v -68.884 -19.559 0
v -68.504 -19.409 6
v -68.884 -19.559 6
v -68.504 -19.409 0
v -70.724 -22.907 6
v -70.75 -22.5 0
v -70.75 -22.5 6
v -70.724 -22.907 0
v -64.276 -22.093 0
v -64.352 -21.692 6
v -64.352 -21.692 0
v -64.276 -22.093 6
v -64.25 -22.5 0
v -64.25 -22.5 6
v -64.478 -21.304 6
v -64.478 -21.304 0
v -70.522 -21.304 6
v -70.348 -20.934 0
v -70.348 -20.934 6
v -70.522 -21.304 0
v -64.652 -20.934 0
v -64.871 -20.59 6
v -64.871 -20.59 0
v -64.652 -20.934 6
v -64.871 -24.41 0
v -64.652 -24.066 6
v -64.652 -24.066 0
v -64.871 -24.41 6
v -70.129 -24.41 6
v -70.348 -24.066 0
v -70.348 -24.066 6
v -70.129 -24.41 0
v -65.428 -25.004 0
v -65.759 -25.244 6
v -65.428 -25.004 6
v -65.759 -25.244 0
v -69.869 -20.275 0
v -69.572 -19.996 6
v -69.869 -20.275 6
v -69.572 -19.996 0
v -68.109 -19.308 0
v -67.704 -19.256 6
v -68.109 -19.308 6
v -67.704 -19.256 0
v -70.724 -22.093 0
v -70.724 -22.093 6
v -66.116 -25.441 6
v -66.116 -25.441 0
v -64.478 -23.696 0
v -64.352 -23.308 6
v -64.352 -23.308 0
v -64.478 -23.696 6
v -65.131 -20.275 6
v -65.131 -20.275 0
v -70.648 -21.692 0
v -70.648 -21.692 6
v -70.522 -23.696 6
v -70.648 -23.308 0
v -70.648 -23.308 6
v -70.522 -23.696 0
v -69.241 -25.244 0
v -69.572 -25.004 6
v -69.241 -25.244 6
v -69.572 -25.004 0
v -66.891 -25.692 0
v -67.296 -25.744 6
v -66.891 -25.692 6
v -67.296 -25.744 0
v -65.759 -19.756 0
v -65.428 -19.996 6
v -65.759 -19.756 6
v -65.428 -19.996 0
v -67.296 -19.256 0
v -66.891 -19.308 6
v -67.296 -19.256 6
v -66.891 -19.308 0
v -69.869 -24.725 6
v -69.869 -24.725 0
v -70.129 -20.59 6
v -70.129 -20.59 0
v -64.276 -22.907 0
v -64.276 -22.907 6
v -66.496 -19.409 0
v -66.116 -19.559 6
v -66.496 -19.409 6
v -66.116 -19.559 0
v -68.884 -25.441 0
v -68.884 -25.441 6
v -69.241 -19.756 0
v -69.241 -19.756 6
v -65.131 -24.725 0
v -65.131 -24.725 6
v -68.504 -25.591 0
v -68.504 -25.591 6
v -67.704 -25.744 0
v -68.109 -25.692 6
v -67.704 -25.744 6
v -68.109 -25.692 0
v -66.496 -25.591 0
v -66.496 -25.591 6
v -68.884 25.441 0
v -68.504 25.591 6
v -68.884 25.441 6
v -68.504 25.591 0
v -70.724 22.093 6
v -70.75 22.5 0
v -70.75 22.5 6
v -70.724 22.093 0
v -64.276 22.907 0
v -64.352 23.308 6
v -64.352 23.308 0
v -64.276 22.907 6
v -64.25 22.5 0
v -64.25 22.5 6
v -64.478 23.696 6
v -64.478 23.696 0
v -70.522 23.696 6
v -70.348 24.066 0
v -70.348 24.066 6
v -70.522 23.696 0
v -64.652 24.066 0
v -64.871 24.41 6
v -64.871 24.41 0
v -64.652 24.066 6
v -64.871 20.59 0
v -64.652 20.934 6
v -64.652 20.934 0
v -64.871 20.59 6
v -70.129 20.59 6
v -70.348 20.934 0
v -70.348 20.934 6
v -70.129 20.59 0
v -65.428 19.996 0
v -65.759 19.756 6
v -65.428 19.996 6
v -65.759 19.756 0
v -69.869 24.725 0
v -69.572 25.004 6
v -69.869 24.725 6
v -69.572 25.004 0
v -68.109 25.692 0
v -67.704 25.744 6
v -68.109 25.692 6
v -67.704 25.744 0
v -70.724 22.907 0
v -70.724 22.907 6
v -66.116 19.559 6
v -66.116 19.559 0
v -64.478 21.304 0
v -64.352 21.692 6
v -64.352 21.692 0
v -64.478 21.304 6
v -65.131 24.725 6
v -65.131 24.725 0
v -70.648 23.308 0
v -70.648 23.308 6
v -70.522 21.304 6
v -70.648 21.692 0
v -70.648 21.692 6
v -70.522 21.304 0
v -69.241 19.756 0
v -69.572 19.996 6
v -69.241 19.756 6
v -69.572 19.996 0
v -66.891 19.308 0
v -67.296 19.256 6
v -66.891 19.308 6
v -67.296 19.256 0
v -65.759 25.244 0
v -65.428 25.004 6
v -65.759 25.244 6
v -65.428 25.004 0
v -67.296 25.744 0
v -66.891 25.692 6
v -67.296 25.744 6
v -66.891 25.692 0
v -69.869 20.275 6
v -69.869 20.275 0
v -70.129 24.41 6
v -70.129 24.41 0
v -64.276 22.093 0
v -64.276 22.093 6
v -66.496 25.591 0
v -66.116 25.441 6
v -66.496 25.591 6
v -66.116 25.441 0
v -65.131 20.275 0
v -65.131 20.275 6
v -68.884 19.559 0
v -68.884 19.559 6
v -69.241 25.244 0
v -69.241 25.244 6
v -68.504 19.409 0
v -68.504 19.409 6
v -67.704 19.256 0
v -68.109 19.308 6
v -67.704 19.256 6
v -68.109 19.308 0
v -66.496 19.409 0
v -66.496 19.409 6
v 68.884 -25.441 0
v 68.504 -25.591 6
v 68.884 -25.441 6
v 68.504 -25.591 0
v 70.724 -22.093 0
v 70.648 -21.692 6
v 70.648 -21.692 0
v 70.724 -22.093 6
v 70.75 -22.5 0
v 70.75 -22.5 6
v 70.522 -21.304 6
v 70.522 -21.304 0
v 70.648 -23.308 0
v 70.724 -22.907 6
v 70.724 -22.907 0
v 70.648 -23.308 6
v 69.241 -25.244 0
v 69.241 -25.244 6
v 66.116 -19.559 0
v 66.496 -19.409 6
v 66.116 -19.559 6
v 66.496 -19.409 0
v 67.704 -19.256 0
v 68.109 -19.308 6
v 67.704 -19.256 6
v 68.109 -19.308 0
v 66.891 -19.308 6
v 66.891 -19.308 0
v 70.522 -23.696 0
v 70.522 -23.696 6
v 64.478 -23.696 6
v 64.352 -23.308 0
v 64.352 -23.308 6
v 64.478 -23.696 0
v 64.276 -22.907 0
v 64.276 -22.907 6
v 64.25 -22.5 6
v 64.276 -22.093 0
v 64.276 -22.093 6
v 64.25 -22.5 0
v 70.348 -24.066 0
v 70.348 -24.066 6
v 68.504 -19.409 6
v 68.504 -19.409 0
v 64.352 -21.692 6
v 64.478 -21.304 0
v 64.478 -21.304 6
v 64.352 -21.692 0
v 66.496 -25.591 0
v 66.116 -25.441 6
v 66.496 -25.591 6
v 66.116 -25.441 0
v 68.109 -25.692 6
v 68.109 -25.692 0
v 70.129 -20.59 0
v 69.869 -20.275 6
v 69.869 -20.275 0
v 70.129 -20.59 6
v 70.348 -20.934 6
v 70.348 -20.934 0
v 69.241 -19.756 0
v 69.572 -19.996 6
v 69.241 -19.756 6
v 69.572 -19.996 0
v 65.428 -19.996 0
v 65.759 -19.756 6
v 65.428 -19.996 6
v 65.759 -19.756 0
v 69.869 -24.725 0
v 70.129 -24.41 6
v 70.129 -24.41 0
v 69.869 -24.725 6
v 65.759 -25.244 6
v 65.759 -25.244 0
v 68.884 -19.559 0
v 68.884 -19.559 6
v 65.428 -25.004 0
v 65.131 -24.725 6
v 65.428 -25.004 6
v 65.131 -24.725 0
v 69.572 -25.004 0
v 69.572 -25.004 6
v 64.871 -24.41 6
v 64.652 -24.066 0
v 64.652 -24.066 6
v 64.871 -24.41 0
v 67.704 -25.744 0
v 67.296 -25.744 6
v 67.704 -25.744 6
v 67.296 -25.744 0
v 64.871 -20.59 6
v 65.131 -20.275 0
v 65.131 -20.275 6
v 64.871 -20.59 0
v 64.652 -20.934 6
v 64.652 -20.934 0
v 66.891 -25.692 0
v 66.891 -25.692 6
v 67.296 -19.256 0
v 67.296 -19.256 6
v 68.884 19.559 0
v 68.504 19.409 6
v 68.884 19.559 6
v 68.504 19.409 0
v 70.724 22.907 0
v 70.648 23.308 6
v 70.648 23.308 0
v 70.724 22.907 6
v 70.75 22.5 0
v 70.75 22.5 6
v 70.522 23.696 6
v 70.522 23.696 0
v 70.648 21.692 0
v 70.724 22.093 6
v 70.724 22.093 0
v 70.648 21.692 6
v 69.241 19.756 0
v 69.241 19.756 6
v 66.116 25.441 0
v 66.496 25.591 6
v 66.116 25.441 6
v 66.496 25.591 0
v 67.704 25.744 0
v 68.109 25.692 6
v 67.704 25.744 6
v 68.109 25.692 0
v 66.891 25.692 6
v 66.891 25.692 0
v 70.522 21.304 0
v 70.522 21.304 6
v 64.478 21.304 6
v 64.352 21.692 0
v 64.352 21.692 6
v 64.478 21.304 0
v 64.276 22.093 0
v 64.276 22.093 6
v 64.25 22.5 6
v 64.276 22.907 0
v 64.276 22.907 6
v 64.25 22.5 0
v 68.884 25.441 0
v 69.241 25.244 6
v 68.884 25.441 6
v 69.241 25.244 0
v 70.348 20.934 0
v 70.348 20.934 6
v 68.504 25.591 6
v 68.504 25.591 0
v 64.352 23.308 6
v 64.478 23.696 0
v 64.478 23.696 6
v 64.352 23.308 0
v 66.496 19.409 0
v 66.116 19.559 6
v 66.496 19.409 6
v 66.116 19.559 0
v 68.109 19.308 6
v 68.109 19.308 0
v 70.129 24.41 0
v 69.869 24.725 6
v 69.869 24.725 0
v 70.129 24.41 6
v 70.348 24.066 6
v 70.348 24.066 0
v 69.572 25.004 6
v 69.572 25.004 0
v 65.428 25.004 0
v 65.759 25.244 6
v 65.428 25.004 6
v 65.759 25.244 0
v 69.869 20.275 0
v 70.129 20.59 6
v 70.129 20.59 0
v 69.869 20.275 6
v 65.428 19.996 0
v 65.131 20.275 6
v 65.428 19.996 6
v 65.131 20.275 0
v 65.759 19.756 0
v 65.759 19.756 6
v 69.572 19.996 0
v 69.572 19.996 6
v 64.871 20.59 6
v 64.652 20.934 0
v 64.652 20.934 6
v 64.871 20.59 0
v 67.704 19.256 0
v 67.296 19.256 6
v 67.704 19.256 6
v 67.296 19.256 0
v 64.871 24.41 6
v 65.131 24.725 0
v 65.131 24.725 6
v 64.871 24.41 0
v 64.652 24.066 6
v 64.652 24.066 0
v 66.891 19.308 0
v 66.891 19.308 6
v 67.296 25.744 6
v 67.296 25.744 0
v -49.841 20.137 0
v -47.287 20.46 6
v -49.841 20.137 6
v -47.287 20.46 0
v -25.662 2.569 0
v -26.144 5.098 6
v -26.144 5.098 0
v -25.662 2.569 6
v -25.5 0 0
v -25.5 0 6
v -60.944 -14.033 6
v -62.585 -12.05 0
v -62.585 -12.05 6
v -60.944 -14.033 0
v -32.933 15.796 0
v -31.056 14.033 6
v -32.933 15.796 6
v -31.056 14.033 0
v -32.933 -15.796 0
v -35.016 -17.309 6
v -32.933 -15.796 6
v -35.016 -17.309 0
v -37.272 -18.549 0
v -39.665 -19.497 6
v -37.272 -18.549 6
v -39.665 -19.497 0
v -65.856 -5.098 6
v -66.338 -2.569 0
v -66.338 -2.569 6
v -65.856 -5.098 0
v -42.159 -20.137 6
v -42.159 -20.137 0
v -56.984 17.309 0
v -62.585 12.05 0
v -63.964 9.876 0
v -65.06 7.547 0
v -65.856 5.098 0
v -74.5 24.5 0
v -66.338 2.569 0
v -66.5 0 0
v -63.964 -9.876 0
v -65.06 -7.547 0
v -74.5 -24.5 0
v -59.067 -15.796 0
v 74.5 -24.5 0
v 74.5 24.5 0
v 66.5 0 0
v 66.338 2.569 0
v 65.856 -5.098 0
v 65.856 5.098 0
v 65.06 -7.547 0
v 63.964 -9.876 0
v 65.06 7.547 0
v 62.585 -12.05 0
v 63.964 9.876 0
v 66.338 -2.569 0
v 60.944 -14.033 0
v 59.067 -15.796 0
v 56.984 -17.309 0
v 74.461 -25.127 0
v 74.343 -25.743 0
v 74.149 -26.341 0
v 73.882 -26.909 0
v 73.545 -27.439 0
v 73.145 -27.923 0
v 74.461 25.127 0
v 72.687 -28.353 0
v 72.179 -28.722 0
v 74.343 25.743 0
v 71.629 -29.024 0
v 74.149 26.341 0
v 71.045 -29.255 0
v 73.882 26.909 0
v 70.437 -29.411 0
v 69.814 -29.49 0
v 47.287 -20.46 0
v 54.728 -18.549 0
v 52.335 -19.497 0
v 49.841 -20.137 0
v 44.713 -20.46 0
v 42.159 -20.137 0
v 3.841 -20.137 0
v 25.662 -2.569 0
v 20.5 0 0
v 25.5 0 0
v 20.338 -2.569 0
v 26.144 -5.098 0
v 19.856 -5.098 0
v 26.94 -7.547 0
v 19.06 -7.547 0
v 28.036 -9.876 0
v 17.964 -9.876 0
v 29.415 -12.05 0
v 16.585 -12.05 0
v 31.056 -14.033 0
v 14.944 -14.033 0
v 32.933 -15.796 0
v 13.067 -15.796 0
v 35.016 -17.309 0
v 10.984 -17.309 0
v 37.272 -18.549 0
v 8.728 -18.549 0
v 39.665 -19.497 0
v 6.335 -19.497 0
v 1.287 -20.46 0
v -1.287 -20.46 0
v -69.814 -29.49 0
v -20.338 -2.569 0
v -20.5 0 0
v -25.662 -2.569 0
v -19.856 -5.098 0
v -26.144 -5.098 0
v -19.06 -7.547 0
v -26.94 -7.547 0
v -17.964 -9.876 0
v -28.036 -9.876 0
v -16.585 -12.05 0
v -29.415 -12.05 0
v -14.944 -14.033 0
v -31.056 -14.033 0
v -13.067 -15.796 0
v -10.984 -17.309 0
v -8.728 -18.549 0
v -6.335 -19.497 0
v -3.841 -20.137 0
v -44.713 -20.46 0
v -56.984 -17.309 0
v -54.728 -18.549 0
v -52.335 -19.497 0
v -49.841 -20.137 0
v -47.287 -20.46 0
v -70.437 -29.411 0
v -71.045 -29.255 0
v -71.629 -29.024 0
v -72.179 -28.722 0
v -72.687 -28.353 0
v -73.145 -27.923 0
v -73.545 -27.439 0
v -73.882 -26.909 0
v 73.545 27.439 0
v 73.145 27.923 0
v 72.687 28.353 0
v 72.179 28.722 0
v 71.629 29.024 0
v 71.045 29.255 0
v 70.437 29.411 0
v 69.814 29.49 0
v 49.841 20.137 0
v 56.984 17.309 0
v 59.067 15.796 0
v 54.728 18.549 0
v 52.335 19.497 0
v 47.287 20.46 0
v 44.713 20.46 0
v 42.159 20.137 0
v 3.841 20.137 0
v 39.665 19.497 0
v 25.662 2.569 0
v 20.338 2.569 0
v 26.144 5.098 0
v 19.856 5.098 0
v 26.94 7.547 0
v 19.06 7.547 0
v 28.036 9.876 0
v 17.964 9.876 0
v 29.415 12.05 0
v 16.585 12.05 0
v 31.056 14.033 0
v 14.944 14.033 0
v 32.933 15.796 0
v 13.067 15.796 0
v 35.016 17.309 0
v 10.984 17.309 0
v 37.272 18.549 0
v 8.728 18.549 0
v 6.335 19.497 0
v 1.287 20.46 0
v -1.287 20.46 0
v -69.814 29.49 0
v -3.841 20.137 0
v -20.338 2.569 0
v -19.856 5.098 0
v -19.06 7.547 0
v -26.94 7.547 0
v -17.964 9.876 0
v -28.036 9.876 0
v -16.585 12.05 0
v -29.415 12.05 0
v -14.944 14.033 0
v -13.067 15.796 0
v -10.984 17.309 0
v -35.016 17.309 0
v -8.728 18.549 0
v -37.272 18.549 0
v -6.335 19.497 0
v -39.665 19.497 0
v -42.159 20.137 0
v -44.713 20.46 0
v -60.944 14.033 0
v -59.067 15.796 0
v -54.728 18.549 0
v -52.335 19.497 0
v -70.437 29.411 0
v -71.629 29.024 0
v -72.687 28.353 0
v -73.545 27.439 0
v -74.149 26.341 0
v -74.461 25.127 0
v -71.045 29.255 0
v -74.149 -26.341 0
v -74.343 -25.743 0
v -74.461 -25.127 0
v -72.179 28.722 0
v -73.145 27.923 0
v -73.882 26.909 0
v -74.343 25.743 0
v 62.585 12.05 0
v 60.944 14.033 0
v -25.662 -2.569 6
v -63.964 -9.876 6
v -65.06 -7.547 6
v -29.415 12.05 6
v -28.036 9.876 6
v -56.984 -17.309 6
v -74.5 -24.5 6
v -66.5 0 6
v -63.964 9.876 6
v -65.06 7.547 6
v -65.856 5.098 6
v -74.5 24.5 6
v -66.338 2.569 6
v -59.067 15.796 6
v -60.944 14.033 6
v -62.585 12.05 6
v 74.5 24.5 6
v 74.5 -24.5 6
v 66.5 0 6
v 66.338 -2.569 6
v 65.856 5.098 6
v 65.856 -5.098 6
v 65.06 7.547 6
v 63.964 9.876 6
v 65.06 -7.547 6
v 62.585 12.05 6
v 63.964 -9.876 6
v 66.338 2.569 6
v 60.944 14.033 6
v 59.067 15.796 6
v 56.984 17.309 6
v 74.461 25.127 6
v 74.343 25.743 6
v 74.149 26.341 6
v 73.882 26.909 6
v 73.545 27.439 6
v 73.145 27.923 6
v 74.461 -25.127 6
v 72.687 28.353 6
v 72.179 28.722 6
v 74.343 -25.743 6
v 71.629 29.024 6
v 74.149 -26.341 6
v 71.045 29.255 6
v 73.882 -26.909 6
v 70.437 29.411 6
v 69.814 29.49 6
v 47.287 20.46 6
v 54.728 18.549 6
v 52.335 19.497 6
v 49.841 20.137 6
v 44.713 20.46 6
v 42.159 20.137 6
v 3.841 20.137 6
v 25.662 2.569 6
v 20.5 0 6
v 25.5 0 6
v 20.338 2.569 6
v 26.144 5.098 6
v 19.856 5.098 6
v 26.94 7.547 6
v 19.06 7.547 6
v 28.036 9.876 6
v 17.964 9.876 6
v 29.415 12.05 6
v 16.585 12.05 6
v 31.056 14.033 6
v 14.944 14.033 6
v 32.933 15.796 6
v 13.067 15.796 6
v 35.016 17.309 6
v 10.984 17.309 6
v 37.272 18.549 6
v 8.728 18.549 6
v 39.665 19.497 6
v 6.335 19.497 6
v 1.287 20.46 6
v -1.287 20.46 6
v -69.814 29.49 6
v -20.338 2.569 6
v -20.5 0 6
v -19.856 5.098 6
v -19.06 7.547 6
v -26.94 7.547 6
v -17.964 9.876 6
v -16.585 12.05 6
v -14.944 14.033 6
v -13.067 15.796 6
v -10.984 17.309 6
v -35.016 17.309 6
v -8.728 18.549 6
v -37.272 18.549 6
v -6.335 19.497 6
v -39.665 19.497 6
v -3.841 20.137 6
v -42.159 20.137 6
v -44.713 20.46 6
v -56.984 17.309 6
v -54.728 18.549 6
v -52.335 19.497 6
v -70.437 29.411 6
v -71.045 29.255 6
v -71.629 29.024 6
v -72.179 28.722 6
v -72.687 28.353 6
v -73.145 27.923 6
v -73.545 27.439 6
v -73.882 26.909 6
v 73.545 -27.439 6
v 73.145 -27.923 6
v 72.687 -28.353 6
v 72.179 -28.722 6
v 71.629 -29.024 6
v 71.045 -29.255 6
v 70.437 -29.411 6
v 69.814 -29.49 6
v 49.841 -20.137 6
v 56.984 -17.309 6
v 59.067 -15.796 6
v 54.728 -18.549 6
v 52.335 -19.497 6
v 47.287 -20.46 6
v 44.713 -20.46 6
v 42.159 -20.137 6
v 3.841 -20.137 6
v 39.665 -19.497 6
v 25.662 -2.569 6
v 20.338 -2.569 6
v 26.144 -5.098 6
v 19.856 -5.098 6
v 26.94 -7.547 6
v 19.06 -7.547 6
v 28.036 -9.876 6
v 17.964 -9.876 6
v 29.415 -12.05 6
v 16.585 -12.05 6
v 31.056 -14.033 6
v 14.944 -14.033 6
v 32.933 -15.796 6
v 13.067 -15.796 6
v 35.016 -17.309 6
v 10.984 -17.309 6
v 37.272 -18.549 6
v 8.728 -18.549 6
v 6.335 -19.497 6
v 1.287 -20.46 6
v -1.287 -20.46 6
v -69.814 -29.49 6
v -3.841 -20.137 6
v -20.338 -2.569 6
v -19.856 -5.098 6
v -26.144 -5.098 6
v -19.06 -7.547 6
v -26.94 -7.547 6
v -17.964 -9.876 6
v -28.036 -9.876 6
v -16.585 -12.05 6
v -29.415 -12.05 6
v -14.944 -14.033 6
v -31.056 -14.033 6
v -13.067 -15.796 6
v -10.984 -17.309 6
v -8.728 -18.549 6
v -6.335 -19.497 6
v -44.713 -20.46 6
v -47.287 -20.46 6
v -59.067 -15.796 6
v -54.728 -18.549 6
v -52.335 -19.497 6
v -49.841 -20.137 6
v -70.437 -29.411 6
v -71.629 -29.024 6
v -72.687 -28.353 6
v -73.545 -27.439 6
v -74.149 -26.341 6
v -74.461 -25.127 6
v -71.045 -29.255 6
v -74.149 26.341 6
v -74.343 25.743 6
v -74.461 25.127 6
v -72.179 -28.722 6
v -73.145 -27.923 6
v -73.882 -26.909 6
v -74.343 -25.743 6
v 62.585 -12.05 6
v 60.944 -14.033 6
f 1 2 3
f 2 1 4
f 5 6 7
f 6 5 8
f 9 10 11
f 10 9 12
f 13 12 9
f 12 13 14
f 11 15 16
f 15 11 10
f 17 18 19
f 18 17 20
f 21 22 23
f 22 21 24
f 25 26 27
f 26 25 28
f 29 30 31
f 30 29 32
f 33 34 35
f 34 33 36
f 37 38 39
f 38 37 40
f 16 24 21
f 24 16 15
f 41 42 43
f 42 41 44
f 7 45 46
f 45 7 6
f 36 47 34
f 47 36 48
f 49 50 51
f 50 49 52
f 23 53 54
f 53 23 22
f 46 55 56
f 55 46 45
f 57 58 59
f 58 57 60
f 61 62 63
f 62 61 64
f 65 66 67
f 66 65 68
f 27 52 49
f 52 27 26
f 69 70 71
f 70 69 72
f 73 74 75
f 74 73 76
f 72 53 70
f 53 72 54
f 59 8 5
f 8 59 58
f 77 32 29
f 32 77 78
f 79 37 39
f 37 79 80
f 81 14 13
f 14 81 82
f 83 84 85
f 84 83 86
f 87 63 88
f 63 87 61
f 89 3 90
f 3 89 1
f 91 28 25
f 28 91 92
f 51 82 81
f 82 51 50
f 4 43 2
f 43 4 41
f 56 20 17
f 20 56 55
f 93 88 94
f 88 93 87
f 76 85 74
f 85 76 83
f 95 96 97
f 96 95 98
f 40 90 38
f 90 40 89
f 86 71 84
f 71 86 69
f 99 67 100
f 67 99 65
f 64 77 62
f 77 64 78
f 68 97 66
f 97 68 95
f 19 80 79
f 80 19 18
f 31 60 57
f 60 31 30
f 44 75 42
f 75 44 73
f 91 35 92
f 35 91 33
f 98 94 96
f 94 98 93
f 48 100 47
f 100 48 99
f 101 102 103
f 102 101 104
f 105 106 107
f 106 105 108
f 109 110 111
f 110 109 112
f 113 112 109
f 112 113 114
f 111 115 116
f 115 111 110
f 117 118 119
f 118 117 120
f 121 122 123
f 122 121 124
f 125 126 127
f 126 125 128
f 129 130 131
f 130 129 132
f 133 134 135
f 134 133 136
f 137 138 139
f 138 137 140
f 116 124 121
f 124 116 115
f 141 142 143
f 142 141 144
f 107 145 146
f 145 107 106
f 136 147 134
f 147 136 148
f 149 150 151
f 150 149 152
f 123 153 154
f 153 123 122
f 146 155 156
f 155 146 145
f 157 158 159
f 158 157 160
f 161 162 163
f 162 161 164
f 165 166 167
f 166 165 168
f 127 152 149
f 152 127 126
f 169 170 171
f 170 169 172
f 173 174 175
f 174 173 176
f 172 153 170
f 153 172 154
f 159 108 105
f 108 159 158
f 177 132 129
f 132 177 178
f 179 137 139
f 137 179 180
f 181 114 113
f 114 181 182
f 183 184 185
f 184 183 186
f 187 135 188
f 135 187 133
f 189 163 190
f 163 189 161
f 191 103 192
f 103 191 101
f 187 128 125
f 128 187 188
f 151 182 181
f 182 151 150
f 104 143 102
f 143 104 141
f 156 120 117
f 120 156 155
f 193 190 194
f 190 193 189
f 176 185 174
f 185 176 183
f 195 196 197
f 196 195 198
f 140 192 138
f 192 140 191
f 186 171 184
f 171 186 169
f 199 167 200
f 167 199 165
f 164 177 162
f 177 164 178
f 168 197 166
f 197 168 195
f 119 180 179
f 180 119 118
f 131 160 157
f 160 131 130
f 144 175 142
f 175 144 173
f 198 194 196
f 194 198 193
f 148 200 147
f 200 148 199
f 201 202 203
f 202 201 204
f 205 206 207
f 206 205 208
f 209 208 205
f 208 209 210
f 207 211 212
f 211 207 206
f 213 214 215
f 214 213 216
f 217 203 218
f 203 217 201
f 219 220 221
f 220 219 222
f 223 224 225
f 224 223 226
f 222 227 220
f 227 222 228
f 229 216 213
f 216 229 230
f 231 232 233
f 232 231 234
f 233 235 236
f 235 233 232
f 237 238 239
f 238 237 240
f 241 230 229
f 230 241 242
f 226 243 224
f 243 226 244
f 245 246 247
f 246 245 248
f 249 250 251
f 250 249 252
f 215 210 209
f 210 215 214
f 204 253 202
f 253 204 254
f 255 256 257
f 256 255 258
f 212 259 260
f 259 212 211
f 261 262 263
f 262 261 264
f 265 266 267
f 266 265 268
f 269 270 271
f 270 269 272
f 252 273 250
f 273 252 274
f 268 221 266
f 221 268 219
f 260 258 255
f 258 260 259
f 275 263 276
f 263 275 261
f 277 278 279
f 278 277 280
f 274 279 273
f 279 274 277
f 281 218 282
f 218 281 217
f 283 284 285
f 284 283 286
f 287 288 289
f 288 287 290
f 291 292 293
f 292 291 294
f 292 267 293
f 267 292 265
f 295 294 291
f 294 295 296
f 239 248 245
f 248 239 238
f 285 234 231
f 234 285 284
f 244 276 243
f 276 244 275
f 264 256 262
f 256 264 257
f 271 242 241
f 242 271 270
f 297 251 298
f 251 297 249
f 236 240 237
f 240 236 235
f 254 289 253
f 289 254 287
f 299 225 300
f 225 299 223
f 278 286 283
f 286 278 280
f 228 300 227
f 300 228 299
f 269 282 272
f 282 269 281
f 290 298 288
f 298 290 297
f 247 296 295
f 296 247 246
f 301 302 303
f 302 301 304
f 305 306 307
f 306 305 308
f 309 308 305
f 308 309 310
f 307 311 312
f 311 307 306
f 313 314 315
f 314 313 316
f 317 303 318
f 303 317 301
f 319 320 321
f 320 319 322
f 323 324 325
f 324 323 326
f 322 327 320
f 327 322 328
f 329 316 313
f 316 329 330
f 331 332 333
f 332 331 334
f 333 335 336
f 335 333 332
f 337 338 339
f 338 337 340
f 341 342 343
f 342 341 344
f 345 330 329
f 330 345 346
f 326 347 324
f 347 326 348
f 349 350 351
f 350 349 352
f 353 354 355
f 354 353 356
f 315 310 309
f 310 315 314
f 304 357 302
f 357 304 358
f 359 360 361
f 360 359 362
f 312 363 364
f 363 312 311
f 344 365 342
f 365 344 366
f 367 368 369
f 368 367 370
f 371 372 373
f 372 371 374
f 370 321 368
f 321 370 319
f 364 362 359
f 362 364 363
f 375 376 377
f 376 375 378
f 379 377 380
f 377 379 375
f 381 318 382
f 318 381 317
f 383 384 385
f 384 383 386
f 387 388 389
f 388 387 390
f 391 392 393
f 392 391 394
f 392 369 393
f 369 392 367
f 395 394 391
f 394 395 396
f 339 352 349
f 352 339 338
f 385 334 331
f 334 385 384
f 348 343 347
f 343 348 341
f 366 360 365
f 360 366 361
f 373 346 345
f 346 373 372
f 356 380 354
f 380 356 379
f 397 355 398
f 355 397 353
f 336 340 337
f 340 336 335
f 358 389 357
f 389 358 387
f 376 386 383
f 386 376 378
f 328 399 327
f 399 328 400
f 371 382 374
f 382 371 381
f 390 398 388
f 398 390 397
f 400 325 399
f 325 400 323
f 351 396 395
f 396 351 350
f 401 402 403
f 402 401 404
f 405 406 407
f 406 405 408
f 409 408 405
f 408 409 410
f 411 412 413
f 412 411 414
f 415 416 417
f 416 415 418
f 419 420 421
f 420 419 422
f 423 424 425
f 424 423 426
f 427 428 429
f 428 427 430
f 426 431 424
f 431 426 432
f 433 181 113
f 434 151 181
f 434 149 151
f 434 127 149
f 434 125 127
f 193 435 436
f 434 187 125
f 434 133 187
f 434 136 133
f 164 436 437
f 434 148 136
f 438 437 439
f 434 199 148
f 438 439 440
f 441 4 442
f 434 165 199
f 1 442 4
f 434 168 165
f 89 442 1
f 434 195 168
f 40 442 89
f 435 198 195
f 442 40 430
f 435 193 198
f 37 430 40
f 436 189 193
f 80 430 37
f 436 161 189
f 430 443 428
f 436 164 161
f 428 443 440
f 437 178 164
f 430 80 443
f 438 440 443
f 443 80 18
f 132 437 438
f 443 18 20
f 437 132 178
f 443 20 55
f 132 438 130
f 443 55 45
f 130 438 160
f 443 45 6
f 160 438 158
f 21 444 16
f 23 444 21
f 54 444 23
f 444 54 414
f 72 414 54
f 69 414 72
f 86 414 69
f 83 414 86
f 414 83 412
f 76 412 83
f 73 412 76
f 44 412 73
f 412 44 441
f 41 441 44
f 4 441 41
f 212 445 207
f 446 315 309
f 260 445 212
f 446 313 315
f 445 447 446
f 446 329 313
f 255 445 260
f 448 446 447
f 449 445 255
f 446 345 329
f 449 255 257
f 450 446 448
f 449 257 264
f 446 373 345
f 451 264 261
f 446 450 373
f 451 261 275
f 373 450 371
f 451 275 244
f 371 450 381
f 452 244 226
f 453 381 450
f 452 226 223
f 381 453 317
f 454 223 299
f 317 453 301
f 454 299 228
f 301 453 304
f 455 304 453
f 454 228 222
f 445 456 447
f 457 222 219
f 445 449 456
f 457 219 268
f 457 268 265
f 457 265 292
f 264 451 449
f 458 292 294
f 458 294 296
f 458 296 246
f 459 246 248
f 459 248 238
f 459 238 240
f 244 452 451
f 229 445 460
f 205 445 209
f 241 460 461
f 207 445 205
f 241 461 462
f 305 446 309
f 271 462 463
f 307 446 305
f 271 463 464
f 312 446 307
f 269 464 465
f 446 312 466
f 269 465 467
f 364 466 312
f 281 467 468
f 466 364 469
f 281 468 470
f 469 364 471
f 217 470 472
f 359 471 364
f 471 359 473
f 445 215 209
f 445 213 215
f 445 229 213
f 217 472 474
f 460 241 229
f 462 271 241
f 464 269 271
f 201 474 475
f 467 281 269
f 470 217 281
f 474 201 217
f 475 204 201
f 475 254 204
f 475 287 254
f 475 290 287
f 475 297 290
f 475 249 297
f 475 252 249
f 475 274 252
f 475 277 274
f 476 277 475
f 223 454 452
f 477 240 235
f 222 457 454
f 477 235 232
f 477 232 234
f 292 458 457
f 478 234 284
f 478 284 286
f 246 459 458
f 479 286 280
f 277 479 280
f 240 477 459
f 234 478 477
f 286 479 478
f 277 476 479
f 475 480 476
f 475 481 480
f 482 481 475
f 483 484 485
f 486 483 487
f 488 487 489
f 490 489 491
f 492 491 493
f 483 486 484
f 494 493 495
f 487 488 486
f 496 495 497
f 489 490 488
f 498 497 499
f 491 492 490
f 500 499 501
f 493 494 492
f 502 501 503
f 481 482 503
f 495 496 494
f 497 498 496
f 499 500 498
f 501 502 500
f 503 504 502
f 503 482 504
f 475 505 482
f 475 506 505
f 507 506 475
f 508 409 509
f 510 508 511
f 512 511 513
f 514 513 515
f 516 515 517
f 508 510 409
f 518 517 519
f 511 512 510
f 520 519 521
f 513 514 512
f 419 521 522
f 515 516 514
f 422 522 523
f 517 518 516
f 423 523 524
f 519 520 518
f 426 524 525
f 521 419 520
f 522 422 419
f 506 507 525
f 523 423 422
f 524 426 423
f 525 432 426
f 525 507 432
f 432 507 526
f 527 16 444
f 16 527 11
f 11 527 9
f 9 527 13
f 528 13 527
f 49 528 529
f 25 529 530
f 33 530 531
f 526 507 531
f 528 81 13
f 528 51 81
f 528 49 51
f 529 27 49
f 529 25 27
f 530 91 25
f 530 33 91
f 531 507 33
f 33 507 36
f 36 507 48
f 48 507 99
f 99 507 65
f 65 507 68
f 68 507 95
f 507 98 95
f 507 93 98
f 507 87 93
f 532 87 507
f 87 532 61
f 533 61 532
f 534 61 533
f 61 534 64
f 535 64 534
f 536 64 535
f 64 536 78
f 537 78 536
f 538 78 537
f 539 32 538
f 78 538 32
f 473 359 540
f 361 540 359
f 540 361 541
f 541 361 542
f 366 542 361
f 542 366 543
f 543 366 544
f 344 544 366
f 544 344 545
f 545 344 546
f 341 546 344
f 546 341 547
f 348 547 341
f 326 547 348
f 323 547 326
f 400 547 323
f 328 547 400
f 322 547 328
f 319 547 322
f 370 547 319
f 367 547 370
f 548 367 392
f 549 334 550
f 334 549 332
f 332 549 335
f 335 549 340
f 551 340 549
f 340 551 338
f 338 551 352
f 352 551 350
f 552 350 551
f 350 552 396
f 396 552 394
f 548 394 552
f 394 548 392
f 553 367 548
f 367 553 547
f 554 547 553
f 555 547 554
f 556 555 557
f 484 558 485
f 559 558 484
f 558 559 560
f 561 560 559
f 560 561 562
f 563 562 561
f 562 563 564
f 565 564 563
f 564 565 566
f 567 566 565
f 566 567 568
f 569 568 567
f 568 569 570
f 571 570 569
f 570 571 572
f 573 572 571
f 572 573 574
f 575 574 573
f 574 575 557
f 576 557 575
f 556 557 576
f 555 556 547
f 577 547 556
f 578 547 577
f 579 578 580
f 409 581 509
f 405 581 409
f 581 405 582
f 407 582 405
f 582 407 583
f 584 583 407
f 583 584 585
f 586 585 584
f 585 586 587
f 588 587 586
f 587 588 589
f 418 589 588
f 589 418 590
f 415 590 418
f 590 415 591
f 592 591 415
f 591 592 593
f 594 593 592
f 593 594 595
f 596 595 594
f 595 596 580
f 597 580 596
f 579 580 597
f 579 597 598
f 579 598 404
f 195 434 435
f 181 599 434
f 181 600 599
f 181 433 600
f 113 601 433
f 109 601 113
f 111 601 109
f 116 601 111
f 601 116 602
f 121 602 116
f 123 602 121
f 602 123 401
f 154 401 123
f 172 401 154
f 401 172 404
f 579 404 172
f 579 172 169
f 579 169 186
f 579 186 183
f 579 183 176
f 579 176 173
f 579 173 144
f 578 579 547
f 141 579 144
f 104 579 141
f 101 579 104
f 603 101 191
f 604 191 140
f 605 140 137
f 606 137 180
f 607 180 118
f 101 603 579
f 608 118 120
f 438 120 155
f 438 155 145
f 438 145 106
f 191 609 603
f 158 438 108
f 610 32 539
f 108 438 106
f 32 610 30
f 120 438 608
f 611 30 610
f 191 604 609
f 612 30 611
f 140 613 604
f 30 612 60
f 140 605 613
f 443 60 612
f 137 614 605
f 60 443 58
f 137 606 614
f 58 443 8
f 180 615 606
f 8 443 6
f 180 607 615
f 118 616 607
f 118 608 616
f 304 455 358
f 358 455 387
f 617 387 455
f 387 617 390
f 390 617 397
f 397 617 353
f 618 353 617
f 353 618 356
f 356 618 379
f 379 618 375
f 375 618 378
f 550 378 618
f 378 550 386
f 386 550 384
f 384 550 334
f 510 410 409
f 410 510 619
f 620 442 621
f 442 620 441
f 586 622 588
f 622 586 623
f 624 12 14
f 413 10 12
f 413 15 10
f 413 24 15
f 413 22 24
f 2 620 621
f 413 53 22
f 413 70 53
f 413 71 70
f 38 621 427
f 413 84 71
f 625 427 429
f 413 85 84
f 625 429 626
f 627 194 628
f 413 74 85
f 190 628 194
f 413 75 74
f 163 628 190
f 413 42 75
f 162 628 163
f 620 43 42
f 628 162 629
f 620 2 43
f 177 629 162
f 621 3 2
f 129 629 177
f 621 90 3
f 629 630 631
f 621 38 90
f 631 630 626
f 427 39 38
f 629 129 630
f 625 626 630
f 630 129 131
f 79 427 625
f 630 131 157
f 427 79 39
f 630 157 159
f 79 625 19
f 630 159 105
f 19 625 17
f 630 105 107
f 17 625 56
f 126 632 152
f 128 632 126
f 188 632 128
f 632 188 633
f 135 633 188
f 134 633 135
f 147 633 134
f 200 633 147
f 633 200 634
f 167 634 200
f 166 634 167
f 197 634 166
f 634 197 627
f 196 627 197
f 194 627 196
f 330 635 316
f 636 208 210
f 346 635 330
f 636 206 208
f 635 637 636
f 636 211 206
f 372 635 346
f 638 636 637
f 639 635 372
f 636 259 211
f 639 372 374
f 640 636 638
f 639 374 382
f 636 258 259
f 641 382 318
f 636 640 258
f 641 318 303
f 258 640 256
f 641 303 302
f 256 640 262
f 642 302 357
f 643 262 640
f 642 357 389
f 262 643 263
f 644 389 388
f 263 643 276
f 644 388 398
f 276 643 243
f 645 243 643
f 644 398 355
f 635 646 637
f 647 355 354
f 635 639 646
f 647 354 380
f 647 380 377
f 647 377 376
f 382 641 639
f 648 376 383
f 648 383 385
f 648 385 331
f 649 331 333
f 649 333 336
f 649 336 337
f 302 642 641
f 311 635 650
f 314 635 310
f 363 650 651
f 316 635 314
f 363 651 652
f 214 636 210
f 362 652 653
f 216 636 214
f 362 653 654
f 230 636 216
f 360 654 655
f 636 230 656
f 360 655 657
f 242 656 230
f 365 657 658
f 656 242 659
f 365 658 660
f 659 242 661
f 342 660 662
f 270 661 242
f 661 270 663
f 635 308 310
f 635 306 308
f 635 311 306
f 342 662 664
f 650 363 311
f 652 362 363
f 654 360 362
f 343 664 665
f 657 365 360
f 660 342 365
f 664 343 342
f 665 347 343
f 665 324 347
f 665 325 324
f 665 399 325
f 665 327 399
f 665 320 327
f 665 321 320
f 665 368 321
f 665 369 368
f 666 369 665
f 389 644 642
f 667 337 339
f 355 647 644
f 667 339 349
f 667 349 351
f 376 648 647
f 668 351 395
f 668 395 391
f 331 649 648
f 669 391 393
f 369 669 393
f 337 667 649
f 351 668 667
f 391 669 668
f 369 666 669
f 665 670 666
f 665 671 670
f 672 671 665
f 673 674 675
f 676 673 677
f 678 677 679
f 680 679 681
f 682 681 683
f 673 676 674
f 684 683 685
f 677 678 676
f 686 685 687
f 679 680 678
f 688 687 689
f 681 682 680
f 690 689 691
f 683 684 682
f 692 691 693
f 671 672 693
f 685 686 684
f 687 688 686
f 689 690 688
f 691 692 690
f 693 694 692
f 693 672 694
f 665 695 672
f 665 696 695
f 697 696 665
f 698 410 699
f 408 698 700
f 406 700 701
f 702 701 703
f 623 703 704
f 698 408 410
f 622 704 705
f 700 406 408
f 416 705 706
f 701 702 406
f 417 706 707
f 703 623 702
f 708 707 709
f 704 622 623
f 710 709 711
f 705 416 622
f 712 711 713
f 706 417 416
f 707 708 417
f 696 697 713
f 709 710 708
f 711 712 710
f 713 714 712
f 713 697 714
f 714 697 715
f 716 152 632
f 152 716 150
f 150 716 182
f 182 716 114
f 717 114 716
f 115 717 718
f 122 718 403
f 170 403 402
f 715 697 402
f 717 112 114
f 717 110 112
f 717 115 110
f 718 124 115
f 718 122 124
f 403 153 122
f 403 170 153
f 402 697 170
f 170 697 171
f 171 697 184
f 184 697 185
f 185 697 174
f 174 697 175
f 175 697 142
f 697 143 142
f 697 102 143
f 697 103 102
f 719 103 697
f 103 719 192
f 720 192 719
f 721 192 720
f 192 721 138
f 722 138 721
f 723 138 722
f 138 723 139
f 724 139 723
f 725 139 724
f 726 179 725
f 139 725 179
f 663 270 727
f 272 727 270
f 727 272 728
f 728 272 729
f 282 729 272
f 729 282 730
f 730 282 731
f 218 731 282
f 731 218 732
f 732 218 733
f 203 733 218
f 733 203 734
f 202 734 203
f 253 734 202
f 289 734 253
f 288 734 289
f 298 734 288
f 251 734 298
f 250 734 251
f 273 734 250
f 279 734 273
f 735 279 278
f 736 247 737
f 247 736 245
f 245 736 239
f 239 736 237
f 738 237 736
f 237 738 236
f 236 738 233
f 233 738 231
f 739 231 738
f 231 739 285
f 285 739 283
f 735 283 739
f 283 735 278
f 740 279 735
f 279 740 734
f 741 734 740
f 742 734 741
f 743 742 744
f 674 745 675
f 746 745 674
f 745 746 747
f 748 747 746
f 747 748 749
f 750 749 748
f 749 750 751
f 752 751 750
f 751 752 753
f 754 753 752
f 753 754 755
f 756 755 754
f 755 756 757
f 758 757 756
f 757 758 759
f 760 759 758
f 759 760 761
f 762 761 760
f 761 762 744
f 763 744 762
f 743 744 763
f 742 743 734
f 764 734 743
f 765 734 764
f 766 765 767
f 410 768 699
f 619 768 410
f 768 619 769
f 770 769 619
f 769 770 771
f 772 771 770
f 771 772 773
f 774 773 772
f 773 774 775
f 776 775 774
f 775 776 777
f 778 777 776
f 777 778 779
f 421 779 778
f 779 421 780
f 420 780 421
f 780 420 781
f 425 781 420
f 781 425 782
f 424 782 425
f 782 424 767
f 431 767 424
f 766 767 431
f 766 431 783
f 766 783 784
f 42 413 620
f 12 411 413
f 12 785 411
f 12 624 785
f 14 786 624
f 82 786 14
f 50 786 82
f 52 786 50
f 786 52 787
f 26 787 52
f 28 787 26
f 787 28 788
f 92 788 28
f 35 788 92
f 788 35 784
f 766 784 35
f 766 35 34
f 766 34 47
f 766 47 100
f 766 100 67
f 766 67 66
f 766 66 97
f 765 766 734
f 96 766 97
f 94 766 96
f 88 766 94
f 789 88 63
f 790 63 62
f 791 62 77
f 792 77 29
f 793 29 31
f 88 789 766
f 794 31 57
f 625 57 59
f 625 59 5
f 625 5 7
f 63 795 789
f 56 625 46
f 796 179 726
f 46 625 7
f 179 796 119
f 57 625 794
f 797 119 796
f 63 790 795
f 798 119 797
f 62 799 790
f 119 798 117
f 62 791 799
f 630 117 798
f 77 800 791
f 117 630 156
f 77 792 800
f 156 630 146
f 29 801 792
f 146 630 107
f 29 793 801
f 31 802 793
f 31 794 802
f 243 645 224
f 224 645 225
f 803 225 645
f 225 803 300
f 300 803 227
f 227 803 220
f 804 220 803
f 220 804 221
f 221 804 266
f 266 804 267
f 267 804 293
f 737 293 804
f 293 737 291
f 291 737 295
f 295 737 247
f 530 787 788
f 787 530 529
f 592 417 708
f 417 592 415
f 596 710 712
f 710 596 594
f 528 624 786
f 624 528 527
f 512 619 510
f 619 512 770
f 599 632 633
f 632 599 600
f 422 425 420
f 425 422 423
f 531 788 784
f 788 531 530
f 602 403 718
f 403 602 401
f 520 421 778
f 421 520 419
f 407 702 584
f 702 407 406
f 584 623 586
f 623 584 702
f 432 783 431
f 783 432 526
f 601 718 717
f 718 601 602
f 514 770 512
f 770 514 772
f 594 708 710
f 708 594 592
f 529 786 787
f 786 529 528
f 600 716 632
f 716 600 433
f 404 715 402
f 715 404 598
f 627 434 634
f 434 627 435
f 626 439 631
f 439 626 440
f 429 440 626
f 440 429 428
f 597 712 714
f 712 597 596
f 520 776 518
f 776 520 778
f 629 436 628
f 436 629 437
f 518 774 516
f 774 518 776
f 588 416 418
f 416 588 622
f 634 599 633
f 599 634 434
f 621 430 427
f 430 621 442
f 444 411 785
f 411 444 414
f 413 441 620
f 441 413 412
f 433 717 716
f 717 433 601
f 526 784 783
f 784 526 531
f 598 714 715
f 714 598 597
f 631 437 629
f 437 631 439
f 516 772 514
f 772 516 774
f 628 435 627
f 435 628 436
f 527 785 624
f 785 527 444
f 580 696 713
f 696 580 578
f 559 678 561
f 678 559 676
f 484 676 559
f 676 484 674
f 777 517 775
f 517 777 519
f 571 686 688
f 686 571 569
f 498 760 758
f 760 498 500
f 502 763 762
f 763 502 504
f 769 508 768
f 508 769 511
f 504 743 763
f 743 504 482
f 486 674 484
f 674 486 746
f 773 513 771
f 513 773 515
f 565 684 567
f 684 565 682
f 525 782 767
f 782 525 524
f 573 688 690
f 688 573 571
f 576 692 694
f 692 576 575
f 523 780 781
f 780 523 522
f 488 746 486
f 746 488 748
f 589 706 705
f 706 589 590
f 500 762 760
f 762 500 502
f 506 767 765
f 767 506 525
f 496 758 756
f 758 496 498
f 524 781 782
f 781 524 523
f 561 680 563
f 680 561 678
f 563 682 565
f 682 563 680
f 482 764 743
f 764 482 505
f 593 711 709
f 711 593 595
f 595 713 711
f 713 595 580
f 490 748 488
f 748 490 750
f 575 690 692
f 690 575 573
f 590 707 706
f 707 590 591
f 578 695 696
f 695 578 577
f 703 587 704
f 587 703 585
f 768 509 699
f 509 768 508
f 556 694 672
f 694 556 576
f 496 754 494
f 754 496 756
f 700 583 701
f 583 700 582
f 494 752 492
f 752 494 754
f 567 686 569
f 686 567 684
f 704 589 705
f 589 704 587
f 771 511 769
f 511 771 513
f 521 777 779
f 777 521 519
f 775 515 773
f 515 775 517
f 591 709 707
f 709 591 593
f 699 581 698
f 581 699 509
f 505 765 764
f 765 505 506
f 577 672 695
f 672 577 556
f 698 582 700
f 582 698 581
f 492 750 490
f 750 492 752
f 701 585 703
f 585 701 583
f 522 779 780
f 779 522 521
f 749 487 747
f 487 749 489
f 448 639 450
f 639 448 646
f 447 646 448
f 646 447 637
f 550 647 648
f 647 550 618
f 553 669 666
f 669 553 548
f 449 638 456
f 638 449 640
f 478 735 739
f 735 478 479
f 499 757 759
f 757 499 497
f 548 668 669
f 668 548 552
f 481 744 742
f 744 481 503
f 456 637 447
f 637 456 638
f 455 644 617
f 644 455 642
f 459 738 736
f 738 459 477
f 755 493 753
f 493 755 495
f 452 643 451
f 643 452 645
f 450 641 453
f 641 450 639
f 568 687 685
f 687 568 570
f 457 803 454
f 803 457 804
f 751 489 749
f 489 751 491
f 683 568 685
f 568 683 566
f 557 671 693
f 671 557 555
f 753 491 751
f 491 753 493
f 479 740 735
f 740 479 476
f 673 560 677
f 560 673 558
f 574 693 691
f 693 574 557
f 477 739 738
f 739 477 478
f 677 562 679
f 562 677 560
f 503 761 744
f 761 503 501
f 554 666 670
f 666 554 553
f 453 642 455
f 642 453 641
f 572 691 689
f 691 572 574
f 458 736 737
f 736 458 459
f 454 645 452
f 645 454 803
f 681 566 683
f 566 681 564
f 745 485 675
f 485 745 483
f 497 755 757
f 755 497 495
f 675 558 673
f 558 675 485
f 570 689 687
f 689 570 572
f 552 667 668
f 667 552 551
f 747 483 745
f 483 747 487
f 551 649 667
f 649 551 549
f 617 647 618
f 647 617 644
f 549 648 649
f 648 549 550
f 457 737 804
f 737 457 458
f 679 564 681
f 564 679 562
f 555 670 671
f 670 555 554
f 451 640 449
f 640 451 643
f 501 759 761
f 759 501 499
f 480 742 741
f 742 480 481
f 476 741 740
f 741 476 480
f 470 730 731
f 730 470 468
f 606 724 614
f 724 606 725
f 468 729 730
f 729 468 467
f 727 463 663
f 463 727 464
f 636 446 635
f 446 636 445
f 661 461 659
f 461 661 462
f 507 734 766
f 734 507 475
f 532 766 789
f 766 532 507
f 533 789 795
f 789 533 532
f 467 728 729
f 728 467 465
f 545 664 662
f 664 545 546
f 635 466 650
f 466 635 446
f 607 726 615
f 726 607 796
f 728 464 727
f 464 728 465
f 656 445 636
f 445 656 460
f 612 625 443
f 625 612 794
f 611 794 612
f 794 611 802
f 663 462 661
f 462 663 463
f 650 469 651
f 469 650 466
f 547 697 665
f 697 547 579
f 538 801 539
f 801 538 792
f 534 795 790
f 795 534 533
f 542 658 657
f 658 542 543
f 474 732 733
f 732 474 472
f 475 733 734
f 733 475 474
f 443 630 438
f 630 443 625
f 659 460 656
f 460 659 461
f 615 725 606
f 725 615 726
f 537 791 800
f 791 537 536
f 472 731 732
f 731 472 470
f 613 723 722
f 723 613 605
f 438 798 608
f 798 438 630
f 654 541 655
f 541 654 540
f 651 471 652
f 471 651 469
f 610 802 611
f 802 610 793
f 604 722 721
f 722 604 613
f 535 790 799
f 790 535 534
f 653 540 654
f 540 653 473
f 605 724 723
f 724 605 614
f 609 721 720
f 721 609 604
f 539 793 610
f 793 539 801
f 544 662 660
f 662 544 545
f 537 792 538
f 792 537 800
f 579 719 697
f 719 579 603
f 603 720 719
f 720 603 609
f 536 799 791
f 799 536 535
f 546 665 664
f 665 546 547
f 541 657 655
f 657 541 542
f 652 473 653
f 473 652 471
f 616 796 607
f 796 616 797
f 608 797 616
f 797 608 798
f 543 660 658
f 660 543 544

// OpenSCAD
$fn = 50;


difference() {
	union() {
		hull() {
			translate(v = [-69.5000000000, 24.5000000000, 0]) {
				cylinder(h = 6, r = 5);
			}
			translate(v = [69.5000000000, 24.5000000000, 0]) {
				cylinder(h = 6, r = 5);
			}
			translate(v = [-69.5000000000, -24.5000000000, 0]) {
				cylinder(h = 6, r = 5);
			}
			translate(v = [69.5000000000, -24.5000000000, 0]) {
				cylinder(h = 6, r = 5);
			}
		}
	}
	union() {
		#translate(v = [-67.5000000000, -22.5000000000, -100.0000000000]) {
			cylinder(h = 200, r = 3.2500000000);
		}
		#translate(v = [-67.5000000000, 22.5000000000, -100.0000000000]) {
			cylinder(h = 200, r = 3.2500000000);
		}
		#translate(v = [67.5000000000, -22.5000000000, -100.0000000000]) {
			cylinder(h = 200, r = 3.2500000000);
		}
		#translate(v = [67.5000000000, 22.5000000000, -100.0000000000]) {
			cylinder(h = 200, r = 3.2500000000);
		}
		#translate(v = [-46.0000000000, 0, 0]) {
			cylinder(h = 6, r = 20.5000000000);
		}
		#cylinder(h = 6, r = 20.5000000000);
		#translate(v = [46.0000000000, 0, 0]) {
			cylinder(h = 6, r = 20.5000000000);
		}
	}
}
